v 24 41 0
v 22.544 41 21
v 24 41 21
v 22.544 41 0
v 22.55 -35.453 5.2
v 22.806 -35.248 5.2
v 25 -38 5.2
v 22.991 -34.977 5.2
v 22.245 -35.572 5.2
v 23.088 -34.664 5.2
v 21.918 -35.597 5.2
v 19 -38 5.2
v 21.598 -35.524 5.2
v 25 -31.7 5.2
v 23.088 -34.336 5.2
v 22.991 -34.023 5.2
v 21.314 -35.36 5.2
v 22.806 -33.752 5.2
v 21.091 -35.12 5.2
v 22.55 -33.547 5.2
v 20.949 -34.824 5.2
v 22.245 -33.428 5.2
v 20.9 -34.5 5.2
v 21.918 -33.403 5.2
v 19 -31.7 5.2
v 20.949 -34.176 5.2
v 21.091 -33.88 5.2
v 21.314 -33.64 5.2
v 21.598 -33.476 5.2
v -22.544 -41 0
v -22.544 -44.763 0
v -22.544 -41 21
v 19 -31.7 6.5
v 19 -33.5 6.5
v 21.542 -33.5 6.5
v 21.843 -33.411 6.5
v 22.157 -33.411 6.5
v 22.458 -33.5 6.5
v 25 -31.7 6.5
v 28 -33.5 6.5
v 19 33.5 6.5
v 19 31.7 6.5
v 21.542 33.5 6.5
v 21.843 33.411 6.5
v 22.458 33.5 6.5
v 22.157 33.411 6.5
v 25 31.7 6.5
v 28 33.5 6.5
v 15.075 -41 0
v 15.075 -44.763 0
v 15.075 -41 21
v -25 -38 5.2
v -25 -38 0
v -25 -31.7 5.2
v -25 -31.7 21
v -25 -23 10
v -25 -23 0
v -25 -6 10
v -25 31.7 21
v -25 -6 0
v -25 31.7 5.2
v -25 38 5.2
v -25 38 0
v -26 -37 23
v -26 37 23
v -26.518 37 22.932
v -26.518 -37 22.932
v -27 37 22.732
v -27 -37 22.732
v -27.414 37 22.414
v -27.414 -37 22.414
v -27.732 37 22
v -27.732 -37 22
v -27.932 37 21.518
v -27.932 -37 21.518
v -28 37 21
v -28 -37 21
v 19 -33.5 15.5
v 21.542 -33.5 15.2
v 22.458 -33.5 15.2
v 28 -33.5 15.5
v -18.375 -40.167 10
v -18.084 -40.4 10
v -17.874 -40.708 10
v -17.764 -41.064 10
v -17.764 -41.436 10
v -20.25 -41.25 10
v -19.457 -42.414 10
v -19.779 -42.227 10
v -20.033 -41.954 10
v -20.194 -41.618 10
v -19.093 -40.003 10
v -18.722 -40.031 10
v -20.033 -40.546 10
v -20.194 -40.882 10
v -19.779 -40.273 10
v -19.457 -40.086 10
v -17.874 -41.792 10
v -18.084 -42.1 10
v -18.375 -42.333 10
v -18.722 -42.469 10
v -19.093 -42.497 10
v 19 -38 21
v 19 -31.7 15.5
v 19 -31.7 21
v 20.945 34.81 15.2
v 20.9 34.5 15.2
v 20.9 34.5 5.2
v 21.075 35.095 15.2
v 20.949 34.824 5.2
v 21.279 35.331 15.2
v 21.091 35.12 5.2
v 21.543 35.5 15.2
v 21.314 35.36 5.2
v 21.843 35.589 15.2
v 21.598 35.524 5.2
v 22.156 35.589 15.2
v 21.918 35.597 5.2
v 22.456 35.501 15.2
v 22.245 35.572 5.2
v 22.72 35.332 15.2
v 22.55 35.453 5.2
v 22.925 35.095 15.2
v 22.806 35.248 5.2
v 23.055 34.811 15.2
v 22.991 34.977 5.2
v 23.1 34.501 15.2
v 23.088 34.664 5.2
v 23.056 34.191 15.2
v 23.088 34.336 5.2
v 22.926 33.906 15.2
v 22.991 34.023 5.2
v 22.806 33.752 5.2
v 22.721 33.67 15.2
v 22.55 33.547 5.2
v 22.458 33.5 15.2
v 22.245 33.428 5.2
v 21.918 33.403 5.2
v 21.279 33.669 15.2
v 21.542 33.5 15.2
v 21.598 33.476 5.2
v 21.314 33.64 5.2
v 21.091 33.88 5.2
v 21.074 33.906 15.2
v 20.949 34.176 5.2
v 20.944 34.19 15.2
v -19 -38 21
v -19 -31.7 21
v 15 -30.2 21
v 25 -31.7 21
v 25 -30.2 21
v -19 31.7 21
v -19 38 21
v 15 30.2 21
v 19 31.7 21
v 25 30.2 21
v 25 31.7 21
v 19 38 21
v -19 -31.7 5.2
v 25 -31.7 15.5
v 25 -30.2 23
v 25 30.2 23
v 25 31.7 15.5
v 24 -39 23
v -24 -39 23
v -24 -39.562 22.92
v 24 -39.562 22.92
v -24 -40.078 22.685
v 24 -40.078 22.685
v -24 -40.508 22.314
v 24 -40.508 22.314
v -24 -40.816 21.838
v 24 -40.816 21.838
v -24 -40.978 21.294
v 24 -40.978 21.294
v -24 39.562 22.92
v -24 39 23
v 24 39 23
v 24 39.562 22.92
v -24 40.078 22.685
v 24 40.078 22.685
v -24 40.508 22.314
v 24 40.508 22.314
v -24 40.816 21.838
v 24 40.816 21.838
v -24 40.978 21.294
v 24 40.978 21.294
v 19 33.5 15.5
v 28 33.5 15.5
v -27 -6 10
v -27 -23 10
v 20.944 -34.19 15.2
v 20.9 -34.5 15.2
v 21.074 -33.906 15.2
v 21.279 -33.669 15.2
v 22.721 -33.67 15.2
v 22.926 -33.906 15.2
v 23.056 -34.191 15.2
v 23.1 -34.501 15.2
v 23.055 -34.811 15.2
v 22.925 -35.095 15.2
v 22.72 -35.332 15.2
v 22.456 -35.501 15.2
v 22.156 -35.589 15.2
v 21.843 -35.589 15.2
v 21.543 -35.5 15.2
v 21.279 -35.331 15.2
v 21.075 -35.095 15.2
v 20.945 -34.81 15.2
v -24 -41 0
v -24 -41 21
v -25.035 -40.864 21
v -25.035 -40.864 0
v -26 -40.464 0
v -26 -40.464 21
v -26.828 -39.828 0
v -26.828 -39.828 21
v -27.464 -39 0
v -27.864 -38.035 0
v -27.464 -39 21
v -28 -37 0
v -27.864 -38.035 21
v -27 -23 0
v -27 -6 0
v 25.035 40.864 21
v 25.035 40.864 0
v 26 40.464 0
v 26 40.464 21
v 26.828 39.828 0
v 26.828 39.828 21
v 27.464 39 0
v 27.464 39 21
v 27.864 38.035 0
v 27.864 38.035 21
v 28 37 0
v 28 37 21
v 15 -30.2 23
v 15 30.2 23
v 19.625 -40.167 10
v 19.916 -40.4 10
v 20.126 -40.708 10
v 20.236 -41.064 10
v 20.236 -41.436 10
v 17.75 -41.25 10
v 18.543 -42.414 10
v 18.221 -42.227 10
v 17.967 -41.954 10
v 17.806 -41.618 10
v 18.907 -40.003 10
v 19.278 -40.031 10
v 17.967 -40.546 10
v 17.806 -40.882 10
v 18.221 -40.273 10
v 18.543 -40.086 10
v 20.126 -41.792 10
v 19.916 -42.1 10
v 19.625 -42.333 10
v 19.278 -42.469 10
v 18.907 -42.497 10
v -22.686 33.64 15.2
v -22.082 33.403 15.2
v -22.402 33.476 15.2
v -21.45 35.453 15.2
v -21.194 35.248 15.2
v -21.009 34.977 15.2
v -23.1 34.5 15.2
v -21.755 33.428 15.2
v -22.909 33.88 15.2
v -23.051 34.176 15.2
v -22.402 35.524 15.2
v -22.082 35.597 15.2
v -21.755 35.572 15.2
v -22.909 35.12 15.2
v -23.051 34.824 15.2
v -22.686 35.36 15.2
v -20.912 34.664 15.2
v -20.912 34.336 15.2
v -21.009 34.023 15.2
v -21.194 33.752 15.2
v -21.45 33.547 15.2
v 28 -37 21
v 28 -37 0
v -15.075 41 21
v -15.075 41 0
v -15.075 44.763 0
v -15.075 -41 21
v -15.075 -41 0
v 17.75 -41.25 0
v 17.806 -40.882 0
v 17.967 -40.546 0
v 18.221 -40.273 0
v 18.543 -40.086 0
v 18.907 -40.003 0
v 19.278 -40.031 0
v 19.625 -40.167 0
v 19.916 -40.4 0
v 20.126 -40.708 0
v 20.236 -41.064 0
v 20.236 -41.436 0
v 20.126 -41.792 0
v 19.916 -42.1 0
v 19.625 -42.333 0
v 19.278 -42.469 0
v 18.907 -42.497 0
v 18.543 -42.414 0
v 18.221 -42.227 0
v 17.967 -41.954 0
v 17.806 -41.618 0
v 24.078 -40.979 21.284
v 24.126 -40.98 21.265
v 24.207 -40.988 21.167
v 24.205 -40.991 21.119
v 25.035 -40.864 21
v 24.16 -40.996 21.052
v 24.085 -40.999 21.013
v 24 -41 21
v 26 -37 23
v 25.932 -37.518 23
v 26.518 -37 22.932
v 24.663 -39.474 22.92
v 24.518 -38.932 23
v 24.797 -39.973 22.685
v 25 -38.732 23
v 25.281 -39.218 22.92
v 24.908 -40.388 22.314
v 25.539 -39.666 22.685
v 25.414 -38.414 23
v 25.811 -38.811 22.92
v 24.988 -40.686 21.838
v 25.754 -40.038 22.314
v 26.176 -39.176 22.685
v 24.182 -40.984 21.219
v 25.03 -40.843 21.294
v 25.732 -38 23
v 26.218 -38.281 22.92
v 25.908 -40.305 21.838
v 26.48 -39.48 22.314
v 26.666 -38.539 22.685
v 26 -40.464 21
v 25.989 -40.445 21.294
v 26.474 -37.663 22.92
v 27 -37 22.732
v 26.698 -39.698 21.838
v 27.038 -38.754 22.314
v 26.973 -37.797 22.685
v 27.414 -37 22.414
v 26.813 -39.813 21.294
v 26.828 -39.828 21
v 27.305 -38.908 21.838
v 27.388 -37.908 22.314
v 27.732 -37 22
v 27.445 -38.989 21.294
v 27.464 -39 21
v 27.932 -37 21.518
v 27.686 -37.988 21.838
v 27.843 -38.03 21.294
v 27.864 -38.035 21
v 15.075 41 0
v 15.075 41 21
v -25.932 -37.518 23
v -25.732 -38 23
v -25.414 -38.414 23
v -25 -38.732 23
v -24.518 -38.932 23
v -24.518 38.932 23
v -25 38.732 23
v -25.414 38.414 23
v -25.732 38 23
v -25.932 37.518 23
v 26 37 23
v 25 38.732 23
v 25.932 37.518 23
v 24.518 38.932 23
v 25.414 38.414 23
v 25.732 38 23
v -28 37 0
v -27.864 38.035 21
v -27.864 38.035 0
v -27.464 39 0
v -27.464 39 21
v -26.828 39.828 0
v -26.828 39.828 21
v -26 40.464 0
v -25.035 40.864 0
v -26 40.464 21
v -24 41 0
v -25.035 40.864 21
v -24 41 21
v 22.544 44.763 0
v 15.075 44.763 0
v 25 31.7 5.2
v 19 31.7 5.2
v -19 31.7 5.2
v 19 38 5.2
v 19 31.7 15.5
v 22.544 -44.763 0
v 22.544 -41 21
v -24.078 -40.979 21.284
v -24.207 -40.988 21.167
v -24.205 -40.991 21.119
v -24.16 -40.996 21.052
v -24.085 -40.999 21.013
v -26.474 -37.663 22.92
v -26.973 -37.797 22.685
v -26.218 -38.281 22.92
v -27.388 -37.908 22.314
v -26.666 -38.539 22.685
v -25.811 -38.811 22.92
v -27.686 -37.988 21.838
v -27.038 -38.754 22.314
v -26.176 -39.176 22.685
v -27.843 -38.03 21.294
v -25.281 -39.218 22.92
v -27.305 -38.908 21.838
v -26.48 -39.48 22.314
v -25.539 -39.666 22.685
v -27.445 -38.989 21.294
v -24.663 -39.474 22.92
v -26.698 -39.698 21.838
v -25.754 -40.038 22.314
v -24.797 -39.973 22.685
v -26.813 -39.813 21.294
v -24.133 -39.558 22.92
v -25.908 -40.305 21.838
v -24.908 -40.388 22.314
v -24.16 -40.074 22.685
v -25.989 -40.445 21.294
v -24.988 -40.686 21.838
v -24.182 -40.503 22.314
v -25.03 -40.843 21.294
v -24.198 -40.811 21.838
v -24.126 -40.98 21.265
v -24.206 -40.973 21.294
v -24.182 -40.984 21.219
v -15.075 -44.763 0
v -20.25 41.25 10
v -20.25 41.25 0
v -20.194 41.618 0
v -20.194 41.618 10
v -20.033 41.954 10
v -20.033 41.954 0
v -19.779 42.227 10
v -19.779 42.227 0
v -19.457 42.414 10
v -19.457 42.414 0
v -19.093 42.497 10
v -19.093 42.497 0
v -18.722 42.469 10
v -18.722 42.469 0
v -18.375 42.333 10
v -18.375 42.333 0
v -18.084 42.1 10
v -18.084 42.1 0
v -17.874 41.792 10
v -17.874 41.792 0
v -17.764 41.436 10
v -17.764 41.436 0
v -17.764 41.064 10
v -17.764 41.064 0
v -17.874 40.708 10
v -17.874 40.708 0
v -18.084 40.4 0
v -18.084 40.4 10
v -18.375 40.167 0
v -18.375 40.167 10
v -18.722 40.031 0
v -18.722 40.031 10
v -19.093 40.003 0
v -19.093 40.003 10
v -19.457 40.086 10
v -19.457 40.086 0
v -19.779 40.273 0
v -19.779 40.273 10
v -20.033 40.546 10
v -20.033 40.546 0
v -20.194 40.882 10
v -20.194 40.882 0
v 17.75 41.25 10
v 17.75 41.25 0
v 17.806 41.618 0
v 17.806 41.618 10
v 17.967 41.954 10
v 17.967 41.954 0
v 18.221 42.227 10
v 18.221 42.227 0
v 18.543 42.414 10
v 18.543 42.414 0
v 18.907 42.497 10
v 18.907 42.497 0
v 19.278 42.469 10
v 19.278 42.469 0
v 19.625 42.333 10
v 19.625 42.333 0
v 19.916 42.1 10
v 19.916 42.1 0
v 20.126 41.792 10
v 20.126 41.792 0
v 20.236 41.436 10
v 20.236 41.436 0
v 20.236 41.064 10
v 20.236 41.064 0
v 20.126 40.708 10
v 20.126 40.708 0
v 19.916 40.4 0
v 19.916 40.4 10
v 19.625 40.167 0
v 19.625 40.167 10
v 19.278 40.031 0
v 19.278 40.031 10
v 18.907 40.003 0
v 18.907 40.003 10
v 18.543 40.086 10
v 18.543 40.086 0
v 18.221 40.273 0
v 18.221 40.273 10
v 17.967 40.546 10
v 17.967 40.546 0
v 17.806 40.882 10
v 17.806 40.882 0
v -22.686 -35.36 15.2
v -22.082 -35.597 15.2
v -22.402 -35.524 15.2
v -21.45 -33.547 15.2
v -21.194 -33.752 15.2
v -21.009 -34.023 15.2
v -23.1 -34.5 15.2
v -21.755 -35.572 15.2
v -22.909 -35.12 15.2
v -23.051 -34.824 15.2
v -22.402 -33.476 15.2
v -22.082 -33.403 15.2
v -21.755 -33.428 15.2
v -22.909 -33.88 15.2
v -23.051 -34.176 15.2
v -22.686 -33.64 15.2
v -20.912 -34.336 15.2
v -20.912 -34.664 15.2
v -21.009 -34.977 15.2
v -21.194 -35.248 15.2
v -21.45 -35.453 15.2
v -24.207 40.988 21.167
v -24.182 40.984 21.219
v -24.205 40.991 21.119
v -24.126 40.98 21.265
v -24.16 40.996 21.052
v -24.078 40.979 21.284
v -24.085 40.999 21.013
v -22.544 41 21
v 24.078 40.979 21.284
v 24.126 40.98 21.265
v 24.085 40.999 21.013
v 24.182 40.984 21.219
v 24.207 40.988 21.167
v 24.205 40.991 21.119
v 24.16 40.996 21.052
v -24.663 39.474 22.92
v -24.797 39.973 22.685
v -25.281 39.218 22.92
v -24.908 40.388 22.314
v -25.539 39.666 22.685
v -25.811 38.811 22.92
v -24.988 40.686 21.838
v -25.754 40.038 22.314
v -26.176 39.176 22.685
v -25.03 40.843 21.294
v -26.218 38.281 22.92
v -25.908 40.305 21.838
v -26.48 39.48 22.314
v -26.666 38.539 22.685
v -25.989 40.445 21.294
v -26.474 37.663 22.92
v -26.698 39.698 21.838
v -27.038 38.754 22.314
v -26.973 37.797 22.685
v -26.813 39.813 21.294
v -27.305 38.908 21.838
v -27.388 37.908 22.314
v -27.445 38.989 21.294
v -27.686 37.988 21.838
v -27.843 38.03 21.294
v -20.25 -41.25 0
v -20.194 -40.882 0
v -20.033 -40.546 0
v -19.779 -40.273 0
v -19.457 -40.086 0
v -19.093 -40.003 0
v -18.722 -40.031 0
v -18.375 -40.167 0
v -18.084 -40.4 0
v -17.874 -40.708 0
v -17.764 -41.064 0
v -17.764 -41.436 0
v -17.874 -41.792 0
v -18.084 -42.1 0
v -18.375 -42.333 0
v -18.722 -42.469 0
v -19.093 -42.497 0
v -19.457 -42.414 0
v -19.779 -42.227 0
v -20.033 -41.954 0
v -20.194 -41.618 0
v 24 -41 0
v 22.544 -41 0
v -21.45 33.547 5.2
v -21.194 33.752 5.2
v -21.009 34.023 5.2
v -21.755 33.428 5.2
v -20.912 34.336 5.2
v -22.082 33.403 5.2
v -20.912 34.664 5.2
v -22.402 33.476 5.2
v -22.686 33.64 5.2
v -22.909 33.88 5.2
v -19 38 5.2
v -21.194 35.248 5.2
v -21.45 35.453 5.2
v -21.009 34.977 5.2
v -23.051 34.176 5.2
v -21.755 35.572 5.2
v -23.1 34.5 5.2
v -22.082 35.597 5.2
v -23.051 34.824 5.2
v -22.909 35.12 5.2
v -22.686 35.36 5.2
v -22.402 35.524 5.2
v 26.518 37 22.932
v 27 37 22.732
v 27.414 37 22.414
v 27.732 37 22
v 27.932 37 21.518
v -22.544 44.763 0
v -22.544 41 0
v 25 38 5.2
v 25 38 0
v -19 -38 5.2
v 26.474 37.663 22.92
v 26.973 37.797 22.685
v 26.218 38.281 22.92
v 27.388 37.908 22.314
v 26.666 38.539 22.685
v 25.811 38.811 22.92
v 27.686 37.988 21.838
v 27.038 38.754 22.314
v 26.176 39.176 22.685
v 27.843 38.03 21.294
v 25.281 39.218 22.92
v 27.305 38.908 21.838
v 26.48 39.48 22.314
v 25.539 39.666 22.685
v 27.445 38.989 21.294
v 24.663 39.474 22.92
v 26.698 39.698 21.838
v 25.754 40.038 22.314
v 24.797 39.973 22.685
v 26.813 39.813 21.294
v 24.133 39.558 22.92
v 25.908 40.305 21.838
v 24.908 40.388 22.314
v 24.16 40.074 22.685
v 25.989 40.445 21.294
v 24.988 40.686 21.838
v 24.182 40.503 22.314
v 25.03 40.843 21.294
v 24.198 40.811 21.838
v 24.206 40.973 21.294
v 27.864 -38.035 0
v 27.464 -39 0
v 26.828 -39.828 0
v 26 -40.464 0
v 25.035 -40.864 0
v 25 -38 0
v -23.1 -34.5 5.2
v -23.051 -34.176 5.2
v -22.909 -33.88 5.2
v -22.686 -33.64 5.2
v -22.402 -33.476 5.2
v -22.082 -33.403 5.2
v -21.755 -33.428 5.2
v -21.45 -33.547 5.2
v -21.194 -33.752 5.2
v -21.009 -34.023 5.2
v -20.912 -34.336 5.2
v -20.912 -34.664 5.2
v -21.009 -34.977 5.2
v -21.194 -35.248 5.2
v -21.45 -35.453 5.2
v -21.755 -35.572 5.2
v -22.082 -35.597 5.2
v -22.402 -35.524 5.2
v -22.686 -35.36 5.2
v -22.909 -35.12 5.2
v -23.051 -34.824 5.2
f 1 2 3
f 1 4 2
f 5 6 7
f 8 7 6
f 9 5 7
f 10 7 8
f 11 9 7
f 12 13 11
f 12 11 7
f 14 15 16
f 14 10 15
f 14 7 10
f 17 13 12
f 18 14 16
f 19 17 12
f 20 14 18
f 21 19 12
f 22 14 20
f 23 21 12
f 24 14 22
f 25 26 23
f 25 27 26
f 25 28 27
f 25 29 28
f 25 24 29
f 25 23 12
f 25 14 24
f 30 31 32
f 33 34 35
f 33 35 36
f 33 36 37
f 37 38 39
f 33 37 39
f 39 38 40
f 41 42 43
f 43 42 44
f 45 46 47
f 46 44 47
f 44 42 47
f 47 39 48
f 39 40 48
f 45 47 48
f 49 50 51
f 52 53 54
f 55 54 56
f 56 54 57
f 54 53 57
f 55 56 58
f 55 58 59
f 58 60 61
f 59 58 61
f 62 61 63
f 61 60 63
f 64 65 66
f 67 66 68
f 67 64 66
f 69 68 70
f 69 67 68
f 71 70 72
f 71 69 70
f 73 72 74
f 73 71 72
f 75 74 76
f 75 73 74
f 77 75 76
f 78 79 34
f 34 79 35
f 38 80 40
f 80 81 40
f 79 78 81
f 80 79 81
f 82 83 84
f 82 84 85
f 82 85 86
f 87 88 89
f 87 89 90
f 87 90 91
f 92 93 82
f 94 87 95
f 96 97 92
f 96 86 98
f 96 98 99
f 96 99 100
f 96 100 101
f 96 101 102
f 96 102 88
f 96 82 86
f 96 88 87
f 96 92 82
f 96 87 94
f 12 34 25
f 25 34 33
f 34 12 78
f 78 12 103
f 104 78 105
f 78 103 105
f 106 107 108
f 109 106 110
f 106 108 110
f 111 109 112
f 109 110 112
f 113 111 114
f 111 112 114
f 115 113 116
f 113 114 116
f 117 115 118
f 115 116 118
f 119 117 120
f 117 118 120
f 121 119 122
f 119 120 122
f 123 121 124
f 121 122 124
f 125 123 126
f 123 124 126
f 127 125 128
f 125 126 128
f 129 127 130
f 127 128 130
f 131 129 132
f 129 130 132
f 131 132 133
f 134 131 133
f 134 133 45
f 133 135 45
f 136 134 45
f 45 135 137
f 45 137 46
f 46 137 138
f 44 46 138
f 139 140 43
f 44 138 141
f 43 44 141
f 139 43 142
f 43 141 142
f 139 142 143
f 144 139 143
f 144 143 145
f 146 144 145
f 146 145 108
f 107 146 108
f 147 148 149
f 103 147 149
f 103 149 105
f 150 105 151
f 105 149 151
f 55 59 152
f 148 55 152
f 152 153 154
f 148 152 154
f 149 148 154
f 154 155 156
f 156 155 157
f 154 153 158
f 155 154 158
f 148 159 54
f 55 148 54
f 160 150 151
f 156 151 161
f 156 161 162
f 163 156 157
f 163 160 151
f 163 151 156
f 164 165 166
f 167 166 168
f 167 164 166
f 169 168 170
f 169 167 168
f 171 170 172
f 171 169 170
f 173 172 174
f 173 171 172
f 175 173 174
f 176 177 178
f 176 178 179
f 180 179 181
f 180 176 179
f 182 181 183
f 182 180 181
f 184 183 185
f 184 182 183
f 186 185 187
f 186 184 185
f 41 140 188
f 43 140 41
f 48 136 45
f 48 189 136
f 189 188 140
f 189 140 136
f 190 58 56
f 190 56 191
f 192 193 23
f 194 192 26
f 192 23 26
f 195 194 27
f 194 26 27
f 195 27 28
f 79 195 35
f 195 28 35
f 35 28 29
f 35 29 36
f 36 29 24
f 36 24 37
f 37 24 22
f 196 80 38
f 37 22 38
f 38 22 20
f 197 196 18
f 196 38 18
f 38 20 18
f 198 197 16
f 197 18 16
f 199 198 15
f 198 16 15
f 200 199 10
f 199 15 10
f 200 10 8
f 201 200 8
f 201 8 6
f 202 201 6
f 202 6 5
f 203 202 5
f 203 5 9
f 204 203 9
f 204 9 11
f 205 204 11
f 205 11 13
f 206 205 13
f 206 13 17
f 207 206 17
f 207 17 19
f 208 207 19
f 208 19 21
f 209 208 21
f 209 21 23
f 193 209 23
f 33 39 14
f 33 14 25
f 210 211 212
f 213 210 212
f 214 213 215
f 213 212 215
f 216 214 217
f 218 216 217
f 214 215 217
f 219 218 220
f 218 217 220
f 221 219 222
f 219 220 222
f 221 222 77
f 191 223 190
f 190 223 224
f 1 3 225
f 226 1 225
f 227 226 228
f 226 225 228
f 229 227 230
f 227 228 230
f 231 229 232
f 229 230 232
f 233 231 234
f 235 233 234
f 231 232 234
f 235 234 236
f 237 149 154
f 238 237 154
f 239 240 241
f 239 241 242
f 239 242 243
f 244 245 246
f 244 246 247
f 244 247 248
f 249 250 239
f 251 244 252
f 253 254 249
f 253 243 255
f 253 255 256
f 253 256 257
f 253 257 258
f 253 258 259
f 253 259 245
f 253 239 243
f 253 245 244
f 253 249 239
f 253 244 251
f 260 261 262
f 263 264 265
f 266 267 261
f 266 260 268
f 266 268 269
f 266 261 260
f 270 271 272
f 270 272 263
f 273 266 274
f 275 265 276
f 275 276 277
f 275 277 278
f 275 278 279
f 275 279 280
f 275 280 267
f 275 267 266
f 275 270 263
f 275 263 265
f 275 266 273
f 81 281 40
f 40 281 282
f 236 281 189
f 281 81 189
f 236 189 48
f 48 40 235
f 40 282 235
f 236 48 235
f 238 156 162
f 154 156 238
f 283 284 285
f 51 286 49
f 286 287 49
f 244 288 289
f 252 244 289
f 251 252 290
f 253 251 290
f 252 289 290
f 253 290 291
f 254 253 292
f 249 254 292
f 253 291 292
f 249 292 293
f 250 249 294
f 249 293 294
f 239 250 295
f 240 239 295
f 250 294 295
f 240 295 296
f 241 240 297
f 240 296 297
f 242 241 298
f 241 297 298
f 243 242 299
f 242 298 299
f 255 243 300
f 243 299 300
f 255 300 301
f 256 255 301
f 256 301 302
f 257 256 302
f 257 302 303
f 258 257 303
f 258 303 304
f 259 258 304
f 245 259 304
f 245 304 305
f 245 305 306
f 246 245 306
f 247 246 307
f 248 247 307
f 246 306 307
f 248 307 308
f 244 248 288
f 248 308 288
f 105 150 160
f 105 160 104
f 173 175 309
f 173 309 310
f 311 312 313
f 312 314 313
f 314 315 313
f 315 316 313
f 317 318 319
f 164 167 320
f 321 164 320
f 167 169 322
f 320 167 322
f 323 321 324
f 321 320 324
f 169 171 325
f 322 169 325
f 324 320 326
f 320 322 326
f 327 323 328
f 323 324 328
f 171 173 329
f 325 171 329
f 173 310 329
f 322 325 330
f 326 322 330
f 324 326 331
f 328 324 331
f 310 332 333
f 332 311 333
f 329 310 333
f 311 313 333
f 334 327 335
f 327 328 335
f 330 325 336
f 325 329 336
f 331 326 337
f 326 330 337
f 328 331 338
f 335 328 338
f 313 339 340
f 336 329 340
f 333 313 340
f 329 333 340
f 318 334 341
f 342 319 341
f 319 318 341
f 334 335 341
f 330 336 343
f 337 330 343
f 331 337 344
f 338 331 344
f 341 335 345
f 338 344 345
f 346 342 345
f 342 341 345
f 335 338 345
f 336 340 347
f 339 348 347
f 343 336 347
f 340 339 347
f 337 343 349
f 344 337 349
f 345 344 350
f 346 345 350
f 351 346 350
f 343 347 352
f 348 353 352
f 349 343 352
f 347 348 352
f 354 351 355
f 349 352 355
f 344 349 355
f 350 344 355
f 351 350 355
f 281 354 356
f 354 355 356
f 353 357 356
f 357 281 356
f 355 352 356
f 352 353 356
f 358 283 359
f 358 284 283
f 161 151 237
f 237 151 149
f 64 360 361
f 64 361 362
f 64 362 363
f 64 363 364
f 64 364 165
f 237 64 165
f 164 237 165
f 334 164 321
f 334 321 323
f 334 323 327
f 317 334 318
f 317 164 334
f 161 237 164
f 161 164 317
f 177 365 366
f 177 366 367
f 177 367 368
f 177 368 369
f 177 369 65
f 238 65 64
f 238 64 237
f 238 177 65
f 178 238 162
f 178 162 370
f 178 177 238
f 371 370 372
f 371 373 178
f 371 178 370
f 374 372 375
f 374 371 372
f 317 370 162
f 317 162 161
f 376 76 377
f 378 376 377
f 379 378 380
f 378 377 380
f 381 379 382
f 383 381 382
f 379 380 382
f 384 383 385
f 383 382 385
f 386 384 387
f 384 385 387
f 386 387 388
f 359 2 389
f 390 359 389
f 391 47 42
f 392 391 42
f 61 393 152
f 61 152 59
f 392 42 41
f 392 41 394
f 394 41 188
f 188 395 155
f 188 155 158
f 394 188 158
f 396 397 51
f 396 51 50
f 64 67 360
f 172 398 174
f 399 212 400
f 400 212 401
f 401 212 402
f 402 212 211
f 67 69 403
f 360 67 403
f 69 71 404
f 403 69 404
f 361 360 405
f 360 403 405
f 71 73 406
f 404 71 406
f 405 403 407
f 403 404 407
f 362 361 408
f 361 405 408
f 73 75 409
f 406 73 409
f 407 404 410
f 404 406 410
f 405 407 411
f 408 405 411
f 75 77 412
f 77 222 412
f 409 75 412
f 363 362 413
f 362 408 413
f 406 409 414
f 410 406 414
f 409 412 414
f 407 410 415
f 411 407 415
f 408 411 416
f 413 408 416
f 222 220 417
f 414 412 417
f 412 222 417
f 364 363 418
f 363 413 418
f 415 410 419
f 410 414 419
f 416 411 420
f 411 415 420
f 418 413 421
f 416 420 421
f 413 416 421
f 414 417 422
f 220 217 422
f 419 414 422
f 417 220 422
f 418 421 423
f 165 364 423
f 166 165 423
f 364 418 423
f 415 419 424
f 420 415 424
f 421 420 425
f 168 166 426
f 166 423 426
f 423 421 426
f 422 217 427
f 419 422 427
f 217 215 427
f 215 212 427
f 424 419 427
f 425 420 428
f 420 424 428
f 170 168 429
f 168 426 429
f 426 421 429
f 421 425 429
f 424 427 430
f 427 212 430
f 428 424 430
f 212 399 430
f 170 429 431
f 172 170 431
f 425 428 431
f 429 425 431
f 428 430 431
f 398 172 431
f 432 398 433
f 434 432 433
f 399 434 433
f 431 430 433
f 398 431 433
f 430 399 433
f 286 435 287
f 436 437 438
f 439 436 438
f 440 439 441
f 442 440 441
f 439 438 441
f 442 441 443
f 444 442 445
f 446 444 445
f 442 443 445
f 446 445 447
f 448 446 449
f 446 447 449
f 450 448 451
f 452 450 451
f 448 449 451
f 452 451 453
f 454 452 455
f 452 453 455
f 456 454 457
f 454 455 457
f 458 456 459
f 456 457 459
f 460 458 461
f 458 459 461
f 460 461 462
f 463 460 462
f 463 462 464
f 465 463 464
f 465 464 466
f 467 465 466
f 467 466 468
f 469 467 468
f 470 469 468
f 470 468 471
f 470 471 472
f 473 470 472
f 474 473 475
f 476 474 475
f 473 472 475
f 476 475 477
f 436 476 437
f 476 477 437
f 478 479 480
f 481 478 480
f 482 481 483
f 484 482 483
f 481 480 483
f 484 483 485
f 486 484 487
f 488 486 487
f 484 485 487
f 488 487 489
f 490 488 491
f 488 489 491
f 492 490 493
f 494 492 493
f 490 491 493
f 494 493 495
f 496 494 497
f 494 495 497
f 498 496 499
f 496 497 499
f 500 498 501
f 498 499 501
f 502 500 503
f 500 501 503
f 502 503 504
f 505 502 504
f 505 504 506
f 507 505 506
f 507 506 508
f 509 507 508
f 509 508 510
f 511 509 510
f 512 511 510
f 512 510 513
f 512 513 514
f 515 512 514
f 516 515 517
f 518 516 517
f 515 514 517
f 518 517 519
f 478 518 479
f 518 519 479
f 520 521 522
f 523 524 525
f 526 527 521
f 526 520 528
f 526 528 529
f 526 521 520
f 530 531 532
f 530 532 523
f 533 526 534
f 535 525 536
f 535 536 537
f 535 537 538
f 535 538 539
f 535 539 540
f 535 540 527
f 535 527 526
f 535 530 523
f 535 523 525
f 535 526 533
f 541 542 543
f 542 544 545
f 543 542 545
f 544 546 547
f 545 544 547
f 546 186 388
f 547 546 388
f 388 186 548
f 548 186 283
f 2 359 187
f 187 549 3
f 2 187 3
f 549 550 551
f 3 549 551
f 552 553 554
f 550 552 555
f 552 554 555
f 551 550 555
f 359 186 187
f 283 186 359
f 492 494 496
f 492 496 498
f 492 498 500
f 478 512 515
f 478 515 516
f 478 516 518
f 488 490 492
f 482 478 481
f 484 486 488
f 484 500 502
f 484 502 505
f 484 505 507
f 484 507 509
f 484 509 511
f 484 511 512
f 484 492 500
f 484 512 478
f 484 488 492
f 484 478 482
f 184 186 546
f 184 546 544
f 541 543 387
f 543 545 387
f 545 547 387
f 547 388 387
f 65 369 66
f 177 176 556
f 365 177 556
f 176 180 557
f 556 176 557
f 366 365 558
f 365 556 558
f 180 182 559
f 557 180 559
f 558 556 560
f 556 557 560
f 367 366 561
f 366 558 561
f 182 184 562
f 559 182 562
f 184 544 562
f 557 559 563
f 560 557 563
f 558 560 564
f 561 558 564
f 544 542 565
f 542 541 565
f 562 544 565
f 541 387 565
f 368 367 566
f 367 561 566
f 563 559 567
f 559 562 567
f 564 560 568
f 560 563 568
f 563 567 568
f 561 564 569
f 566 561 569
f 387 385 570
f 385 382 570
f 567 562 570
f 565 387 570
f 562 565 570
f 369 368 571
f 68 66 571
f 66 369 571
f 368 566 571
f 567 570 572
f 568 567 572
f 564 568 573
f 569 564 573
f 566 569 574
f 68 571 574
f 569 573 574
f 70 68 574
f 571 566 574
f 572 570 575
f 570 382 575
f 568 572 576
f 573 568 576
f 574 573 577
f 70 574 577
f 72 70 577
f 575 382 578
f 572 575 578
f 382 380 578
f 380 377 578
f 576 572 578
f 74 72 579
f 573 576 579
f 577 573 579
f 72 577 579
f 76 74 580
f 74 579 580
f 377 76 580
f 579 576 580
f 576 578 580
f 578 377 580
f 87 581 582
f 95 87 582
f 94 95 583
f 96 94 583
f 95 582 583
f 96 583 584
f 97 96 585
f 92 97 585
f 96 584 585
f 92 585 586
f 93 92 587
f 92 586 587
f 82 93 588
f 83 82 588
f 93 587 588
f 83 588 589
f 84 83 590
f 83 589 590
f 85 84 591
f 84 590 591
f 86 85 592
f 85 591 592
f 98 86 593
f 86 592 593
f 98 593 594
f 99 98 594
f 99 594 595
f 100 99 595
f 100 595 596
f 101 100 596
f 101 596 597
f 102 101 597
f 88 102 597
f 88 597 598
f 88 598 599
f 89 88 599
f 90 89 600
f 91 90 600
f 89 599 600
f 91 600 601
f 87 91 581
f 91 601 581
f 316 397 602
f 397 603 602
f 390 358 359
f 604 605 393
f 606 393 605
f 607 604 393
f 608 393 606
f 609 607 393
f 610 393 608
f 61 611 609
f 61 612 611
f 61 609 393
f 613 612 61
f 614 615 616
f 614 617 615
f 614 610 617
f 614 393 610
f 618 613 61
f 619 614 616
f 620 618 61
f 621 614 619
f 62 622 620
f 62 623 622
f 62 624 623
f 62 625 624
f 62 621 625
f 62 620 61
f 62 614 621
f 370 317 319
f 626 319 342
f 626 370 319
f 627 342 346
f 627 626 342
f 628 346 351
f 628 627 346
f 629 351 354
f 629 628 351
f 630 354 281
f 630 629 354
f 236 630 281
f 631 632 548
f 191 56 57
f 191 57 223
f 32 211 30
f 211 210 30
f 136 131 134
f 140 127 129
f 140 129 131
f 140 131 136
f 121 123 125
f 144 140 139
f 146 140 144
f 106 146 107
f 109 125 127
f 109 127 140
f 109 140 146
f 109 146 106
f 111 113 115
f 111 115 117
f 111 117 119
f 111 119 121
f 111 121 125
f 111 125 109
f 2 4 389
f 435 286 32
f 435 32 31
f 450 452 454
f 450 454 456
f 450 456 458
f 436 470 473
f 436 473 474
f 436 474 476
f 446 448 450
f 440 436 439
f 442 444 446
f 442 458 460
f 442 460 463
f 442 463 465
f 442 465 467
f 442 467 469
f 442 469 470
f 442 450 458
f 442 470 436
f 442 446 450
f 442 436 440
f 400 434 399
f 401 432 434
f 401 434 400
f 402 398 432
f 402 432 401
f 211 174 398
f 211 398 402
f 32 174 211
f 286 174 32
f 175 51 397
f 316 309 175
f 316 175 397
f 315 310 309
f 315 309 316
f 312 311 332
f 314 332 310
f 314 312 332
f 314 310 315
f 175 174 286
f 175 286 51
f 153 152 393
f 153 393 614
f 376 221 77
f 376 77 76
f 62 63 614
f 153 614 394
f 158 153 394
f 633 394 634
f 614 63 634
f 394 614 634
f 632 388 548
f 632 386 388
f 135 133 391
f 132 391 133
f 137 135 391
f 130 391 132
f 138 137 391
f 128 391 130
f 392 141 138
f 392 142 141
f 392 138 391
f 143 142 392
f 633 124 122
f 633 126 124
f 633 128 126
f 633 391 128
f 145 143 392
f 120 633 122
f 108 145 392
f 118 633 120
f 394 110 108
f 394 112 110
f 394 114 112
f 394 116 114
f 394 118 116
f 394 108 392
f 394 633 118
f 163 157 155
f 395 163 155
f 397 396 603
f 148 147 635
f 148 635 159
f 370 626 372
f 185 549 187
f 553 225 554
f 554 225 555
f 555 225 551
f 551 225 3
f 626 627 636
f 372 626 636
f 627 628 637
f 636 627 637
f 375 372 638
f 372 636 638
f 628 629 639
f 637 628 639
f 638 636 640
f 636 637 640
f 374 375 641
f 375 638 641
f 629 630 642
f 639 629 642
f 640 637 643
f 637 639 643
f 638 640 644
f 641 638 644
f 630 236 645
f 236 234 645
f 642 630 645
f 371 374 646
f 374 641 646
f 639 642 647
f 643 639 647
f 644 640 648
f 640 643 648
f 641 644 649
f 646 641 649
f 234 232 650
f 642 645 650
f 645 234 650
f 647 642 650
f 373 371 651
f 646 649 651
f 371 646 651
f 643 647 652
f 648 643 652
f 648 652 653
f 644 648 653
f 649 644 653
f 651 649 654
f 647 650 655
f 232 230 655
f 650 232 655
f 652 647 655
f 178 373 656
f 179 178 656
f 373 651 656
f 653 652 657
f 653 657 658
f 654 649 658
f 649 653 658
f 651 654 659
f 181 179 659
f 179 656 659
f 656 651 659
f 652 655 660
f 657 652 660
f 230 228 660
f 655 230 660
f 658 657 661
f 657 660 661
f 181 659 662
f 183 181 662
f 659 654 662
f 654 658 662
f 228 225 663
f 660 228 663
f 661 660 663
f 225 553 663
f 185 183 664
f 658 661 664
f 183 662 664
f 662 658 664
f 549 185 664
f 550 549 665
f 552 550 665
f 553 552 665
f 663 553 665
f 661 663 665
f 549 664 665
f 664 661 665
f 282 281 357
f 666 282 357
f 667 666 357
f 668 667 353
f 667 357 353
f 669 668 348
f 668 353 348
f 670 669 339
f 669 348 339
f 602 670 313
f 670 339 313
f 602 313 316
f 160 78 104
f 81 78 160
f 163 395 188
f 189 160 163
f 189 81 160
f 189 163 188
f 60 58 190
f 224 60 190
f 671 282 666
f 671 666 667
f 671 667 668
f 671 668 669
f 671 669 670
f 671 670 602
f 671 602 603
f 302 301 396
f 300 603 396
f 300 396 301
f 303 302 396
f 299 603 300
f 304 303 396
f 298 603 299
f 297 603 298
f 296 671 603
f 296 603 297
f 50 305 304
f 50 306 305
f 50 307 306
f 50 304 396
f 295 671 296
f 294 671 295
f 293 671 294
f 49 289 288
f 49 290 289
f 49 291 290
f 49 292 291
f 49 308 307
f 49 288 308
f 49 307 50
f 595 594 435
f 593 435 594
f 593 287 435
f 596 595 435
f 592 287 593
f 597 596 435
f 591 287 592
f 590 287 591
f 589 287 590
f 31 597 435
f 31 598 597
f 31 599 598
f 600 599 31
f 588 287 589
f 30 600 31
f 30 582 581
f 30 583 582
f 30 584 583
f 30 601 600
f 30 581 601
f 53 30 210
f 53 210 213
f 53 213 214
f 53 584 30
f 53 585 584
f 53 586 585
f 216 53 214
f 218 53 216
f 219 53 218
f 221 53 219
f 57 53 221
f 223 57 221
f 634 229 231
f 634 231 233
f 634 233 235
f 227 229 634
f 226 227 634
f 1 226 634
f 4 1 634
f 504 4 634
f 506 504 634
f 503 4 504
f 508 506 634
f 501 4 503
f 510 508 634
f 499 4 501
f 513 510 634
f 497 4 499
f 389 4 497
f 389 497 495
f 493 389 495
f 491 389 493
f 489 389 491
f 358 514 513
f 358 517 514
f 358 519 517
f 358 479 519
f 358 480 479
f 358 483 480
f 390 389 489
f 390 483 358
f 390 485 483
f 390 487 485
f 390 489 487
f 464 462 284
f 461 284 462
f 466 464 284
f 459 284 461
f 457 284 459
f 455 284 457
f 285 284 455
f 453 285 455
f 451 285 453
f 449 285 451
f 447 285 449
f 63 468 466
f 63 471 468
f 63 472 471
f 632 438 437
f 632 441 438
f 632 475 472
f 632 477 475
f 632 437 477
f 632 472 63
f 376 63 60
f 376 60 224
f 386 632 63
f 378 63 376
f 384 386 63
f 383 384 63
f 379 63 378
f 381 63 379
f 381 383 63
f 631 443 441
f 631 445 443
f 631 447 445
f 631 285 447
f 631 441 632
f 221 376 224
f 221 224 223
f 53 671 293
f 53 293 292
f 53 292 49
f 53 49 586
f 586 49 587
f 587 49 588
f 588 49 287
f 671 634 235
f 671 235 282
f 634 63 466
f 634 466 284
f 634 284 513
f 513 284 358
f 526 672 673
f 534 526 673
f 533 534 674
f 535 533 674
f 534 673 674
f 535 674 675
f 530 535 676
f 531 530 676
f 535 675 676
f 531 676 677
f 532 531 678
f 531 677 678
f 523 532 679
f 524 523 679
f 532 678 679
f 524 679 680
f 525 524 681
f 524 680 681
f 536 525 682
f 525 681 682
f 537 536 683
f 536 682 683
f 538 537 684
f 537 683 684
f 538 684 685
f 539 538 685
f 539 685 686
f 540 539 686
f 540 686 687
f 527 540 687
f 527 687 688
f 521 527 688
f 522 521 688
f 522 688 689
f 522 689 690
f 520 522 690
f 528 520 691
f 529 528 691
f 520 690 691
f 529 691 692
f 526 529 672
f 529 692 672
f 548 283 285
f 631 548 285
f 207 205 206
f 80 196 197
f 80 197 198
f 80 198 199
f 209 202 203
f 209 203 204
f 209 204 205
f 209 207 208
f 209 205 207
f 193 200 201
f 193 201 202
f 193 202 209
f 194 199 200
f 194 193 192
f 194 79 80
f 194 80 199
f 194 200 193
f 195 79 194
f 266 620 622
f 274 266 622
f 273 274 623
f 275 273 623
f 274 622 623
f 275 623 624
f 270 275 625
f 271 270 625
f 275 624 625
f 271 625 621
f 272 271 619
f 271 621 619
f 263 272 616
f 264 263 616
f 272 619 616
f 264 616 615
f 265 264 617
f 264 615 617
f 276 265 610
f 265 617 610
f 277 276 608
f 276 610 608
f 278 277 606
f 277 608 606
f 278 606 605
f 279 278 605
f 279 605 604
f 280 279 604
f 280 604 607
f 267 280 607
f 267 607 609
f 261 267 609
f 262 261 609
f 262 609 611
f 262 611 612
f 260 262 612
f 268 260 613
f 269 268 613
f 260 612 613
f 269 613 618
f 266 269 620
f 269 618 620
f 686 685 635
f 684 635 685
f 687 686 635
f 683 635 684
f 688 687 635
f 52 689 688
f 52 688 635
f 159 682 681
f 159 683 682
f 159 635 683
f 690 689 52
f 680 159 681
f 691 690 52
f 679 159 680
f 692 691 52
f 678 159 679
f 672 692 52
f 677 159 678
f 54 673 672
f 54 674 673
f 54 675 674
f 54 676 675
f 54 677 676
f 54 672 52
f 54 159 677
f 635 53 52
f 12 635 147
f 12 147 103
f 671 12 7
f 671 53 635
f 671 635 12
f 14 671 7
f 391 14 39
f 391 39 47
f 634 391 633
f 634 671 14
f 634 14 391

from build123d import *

# Parameters (mm, degrees)
CROQUIS1_W                   = 56
CROQUIS1_H                   = 82
CROQUIS1_W_2                 = 50
CROQUIS1_H_2                 = 76
EXTRUIR_L_MINA1_DEPTH        = 22
REDONDEO1_R                  = 4
REDONDEO2_R                  = 4
REDONDEO3_R                  = 4
REDONDEO4_R                  = 4
SALIENTE_EXTRUIR1_DEPTH      = 1
SALIENTE_EXTRUIR1_DEPTH_BACK = 1
REDONDEO5_R                  = 2
CROQUIS3_W                   = 6
CROQUIS3_H                   = 6.3
SALIENTE_EXTRUIR2_DEPTH      = 15.8
CROQUIS4_R                   = 0.75
CORTAR_EXTRUIR1_DEPTH        = 10
CROQUIS5_W                   = 10
CROQUIS5_H                   = 60.4
CORTAR_EXTRUIR2_DEPTH        = 10
CROQUIS6_W                   = 9
CROQUIS6_H                   = 67
CORTAR_EXTRUIR4_DEPTH        = 10
CROQUIS7_W                   = 3.2
CROQUIS7_H                   = 17
CORTAR_EXTRUIR5_DEPTH        = 10
CROQUIS8_W                   = 7.469429576
CROQUIS8_H                   = 3.762632311
SALIENTE_EXTRUIR3_DEPTH      = 22
CORTAR_EXTRUIR6_DEPTH        = 85
CROQUIS10_R                  = 1.25
CORTAR_EXTRUIR7_DEPTH        = 10
CROQUIS11_R                  = 1.1
CORTAR_EXTRUIR8_DEPTH        = 10


with BuildPart() as part:
    # Croquis1 → Extruir-Lámina1 (new body)
    with BuildSketch(Plane.XY):
        Rectangle(CROQUIS1_W, CROQUIS1_H)
        Rectangle(CROQUIS1_W_2, CROQUIS1_H_2, mode=Mode.SUBTRACT)
    extrude(amount=EXTRUIR_L_MINA1_DEPTH)

    # Redondeo1
    redondeo1_edges = [part.edges().sort_by_distance(p)[0] for p in [
        (-28, 41, 11),
    ]]
    fillet(redondeo1_edges, radius=REDONDEO1_R)

    # Redondeo2
    redondeo2_edges = [part.edges().sort_by_distance(p)[0] for p in [
        (28, 41, 11),
    ]]
    fillet(redondeo2_edges, radius=REDONDEO2_R)

    # Redondeo3
    redondeo3_edges = [part.edges().sort_by_distance(p)[0] for p in [
        (28, -41, 11),
    ]]
    fillet(redondeo3_edges, radius=REDONDEO3_R)

    # Redondeo4
    redondeo4_edges = [part.edges().sort_by_distance(p)[0] for p in [
        (-28, -41, 11),
    ]]
    fillet(redondeo4_edges, radius=REDONDEO4_R)

    # Croquis2 → Saliente-Extruir1 (add, two sides: drawn at the far end of the back side and taken through both)
    with BuildSketch(Plane.XY.offset(22).offset(-SALIENTE_EXTRUIR1_DEPTH_BACK)):
        with BuildLine():
            Line((-28, 37), (-28, -37))
            ThreePointArc((-28, -37), (-26.828427125, -39.828427125), (-24, -41))
            Line((-24, -41), (24, -41))
            ThreePointArc((24, -41), (26.828427125, -39.828427125), (28, -37))
            Line((28, -37), (28, 37))
            ThreePointArc((28, 37), (26.828427125, 39.828427125), (24, 41))
            Line((24, 41), (-24, 41))
            ThreePointArc((-24, 41), (-26.828427125, 39.828427125), (-28, 37))
        make_face()
    extrude(amount=SALIENTE_EXTRUIR1_DEPTH + SALIENTE_EXTRUIR1_DEPTH_BACK)

    # Redondeo5
    redondeo5_edges = [part.edges().sort_by_distance(p)[0] for p in [
        (-26.828427125, 39.828427125, 23),
        (-28, 0, 23),
        (-26.828427125, -39.828427125, 23),
        (0, -41, 23),
        (26.828427125, -39.828427125, 23),
        (28, 0, 23),
        (26.828427125, 39.828427125, 23),
        (0, 41, 23),
    ]]
    fillet(redondeo5_edges, radius=REDONDEO5_R)

    # Croquis3 → Saliente-Extruir2 (add)
    with BuildSketch(Plane(origin=(0, 0, 21), x_dir=(-1, 0, 0), z_dir=(0, 0, -1))):
        with Locations((-22, 34.85)):
            Rectangle(CROQUIS3_W, CROQUIS3_H)
        with Locations((-22, -34.85)):
            Rectangle(CROQUIS3_W, CROQUIS3_H)
        with Locations((22, 34.85)):
            Rectangle(CROQUIS3_W, CROQUIS3_H)
        with Locations((22, -34.85)):
            Rectangle(CROQUIS3_W, CROQUIS3_H)
    extrude(amount=SALIENTE_EXTRUIR2_DEPTH)

    # Croquis4 → Cortar-Extruir1 (cut)
    with BuildSketch(Plane(origin=(0, 0, 5.2), x_dir=(-1, 0, 0), z_dir=(0, 0, -1))):
        with Locations((-22, 34.5)):
            Circle(CROQUIS4_R)
        with Locations((22, 34.5)):
            Circle(CROQUIS4_R)
        with Locations((22, -34.5)):
            Circle(CROQUIS4_R)
        with Locations((-22, -34.5)):
            Circle(CROQUIS4_R)
    extrude(amount=-CORTAR_EXTRUIR1_DEPTH, mode=Mode.SUBTRACT)

    # Croquis5 → Cortar-Extruir2 (cut)
    with BuildSketch(Plane(origin=(0, 0, 21), x_dir=(-1, 0, 0), z_dir=(0, 0, -1))):
        with Locations((-20, 0)):
            Rectangle(CROQUIS5_W, CROQUIS5_H)
    extrude(amount=-CORTAR_EXTRUIR2_DEPTH, mode=Mode.SUBTRACT)

    # Croquis6 → Cortar-Extruir4 (cut)
    with BuildSketch(Plane(origin=(28, 0, 0), x_dir=(0, 0, -1), z_dir=(1, 0, 0))):
        with Locations((-11, 0)):
            Rectangle(CROQUIS6_W, CROQUIS6_H)
    extrude(amount=-CORTAR_EXTRUIR4_DEPTH, mode=Mode.SUBTRACT)

    # Croquis7 → Cortar-Extruir5 (cut)
    with BuildSketch(Plane(origin=(0, 0, 0), x_dir=(-1, 0, 0), z_dir=(0, 0, -1))):
        with Locations((25.4, -14.5)):
            Rectangle(CROQUIS7_W, CROQUIS7_H)
    extrude(amount=-CORTAR_EXTRUIR5_DEPTH, mode=Mode.SUBTRACT)

    # Croquis8 → Saliente-Extruir3 (add)
    with BuildSketch(Plane(origin=(0, 0, 0), x_dir=(-1, 0, 0), z_dir=(0, 0, -1))):
        with Locations((18.80938175, 42.881316156)):
            Rectangle(CROQUIS8_W, CROQUIS8_H)
        with Locations((-18.80938175, 42.881316156)):
            Rectangle(CROQUIS8_W, CROQUIS8_H)
        with Locations((-18.80938175, -42.881316156)):
            Rectangle(CROQUIS8_W, CROQUIS8_H)
        with Locations((18.80938175, -42.881316156)):
            Rectangle(CROQUIS8_W, CROQUIS8_H)
    extrude(amount=-SALIENTE_EXTRUIR3_DEPTH)

    # Croquis9 → Cortar-Extruir6 (cut)
    with BuildSketch(Plane(origin=(28, 0, 0), x_dir=(0, 0, -1), z_dir=(1, 0, 0))):
        Polygon((-21, 41), (0, 44.762632311), (0.10305202, 48.489025058), (-25.204298305, 46.436230698), (-22.314872849, 40.902663886), align=None)
        Polygon((-22.314872849, -40.902663886), (-21, -41), (0, -44.762632311), (0.10305202, -48.489025058), (-25.204298305, -46.436230698), align=None)
    extrude(amount=-CORTAR_EXTRUIR6_DEPTH, mode=Mode.SUBTRACT)

    # Croquis10 → Cortar-Extruir7 (cut)
    with BuildSketch(Plane(origin=(0, 0, 0), x_dir=(-1, 0, 0), z_dir=(0, 0, -1))):
        with Locations((-19, 41.25)):
            Circle(CROQUIS10_R)
        with Locations((19, 41.25)):
            Circle(CROQUIS10_R)
        with Locations((-19, -41.25)):
            Circle(CROQUIS10_R)
        with Locations((19, -41.25)):
            Circle(CROQUIS10_R)
    extrude(amount=-CORTAR_EXTRUIR7_DEPTH, mode=Mode.SUBTRACT)

    # Croquis11 → Cortar-Extruir8 (cut)
    with BuildSketch(Plane(origin=(0, 0, 5.2), x_dir=(-1, 0, 0), z_dir=(0, 0, -1))):
        with Locations((-22, 34.5)):
            Circle(CROQUIS11_R)
        with Locations((22, 34.5)):
            Circle(CROQUIS11_R)
        with Locations((22, -34.5)):
            Circle(CROQUIS11_R)
        with Locations((-22, -34.5)):
            Circle(CROQUIS11_R)
    extrude(amount=-CORTAR_EXTRUIR8_DEPTH, mode=Mode.SUBTRACT)


solid = part.part
